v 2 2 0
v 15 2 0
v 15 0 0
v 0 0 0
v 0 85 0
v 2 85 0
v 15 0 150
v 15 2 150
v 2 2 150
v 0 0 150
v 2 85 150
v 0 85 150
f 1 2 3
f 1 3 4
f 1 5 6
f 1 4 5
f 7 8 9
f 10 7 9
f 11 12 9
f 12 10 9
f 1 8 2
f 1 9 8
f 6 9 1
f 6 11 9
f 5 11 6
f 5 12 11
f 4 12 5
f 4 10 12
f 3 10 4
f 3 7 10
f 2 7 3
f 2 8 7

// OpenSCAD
// ==========================================
// トイレ巾木 飛び散り防止カバー (L字型プロトタイプ)
// 固定構造不要（床・壁に沿わせるタイプ）
// ==========================================

// --- パラメータ設定 (単位: mm) ---
guard_height   = 85;    // 立ち上がり高さ（巾木をカバーする高さ）
floor_lip      = 15;    // 床側の張り出し幅（床面の飛び散りをガード）
part_length    = 150;   // 1パーツあたりの長さ（プリンターに合わせて調整可能）
wall_thickness = 2.0;   // カバーの肉厚

module l_shape_guard() {
    linear_extrude(height = part_length) {
        polygon(points=[
            [0, 0],                           // 1. 床と壁の交点（原点）
            [floor_lip, 0],                   // 2. 床側先端（外側）
            [floor_lip, wall_thickness],      // 3. 床側上面（内側）
            [wall_thickness, wall_thickness], // 4. 内側の角（コーナー）
            [wall_thickness, guard_height],   // 5. 壁側内面（右端）
            [0, guard_height]                 // 6. 壁側トップ（外側）
            // （自動的に [0, 0] へ戻り、壁面 [X=0] を下る閉じられたパスになります）
        ]);
    }
}

// レンダリング実行
l_shape_guard();
